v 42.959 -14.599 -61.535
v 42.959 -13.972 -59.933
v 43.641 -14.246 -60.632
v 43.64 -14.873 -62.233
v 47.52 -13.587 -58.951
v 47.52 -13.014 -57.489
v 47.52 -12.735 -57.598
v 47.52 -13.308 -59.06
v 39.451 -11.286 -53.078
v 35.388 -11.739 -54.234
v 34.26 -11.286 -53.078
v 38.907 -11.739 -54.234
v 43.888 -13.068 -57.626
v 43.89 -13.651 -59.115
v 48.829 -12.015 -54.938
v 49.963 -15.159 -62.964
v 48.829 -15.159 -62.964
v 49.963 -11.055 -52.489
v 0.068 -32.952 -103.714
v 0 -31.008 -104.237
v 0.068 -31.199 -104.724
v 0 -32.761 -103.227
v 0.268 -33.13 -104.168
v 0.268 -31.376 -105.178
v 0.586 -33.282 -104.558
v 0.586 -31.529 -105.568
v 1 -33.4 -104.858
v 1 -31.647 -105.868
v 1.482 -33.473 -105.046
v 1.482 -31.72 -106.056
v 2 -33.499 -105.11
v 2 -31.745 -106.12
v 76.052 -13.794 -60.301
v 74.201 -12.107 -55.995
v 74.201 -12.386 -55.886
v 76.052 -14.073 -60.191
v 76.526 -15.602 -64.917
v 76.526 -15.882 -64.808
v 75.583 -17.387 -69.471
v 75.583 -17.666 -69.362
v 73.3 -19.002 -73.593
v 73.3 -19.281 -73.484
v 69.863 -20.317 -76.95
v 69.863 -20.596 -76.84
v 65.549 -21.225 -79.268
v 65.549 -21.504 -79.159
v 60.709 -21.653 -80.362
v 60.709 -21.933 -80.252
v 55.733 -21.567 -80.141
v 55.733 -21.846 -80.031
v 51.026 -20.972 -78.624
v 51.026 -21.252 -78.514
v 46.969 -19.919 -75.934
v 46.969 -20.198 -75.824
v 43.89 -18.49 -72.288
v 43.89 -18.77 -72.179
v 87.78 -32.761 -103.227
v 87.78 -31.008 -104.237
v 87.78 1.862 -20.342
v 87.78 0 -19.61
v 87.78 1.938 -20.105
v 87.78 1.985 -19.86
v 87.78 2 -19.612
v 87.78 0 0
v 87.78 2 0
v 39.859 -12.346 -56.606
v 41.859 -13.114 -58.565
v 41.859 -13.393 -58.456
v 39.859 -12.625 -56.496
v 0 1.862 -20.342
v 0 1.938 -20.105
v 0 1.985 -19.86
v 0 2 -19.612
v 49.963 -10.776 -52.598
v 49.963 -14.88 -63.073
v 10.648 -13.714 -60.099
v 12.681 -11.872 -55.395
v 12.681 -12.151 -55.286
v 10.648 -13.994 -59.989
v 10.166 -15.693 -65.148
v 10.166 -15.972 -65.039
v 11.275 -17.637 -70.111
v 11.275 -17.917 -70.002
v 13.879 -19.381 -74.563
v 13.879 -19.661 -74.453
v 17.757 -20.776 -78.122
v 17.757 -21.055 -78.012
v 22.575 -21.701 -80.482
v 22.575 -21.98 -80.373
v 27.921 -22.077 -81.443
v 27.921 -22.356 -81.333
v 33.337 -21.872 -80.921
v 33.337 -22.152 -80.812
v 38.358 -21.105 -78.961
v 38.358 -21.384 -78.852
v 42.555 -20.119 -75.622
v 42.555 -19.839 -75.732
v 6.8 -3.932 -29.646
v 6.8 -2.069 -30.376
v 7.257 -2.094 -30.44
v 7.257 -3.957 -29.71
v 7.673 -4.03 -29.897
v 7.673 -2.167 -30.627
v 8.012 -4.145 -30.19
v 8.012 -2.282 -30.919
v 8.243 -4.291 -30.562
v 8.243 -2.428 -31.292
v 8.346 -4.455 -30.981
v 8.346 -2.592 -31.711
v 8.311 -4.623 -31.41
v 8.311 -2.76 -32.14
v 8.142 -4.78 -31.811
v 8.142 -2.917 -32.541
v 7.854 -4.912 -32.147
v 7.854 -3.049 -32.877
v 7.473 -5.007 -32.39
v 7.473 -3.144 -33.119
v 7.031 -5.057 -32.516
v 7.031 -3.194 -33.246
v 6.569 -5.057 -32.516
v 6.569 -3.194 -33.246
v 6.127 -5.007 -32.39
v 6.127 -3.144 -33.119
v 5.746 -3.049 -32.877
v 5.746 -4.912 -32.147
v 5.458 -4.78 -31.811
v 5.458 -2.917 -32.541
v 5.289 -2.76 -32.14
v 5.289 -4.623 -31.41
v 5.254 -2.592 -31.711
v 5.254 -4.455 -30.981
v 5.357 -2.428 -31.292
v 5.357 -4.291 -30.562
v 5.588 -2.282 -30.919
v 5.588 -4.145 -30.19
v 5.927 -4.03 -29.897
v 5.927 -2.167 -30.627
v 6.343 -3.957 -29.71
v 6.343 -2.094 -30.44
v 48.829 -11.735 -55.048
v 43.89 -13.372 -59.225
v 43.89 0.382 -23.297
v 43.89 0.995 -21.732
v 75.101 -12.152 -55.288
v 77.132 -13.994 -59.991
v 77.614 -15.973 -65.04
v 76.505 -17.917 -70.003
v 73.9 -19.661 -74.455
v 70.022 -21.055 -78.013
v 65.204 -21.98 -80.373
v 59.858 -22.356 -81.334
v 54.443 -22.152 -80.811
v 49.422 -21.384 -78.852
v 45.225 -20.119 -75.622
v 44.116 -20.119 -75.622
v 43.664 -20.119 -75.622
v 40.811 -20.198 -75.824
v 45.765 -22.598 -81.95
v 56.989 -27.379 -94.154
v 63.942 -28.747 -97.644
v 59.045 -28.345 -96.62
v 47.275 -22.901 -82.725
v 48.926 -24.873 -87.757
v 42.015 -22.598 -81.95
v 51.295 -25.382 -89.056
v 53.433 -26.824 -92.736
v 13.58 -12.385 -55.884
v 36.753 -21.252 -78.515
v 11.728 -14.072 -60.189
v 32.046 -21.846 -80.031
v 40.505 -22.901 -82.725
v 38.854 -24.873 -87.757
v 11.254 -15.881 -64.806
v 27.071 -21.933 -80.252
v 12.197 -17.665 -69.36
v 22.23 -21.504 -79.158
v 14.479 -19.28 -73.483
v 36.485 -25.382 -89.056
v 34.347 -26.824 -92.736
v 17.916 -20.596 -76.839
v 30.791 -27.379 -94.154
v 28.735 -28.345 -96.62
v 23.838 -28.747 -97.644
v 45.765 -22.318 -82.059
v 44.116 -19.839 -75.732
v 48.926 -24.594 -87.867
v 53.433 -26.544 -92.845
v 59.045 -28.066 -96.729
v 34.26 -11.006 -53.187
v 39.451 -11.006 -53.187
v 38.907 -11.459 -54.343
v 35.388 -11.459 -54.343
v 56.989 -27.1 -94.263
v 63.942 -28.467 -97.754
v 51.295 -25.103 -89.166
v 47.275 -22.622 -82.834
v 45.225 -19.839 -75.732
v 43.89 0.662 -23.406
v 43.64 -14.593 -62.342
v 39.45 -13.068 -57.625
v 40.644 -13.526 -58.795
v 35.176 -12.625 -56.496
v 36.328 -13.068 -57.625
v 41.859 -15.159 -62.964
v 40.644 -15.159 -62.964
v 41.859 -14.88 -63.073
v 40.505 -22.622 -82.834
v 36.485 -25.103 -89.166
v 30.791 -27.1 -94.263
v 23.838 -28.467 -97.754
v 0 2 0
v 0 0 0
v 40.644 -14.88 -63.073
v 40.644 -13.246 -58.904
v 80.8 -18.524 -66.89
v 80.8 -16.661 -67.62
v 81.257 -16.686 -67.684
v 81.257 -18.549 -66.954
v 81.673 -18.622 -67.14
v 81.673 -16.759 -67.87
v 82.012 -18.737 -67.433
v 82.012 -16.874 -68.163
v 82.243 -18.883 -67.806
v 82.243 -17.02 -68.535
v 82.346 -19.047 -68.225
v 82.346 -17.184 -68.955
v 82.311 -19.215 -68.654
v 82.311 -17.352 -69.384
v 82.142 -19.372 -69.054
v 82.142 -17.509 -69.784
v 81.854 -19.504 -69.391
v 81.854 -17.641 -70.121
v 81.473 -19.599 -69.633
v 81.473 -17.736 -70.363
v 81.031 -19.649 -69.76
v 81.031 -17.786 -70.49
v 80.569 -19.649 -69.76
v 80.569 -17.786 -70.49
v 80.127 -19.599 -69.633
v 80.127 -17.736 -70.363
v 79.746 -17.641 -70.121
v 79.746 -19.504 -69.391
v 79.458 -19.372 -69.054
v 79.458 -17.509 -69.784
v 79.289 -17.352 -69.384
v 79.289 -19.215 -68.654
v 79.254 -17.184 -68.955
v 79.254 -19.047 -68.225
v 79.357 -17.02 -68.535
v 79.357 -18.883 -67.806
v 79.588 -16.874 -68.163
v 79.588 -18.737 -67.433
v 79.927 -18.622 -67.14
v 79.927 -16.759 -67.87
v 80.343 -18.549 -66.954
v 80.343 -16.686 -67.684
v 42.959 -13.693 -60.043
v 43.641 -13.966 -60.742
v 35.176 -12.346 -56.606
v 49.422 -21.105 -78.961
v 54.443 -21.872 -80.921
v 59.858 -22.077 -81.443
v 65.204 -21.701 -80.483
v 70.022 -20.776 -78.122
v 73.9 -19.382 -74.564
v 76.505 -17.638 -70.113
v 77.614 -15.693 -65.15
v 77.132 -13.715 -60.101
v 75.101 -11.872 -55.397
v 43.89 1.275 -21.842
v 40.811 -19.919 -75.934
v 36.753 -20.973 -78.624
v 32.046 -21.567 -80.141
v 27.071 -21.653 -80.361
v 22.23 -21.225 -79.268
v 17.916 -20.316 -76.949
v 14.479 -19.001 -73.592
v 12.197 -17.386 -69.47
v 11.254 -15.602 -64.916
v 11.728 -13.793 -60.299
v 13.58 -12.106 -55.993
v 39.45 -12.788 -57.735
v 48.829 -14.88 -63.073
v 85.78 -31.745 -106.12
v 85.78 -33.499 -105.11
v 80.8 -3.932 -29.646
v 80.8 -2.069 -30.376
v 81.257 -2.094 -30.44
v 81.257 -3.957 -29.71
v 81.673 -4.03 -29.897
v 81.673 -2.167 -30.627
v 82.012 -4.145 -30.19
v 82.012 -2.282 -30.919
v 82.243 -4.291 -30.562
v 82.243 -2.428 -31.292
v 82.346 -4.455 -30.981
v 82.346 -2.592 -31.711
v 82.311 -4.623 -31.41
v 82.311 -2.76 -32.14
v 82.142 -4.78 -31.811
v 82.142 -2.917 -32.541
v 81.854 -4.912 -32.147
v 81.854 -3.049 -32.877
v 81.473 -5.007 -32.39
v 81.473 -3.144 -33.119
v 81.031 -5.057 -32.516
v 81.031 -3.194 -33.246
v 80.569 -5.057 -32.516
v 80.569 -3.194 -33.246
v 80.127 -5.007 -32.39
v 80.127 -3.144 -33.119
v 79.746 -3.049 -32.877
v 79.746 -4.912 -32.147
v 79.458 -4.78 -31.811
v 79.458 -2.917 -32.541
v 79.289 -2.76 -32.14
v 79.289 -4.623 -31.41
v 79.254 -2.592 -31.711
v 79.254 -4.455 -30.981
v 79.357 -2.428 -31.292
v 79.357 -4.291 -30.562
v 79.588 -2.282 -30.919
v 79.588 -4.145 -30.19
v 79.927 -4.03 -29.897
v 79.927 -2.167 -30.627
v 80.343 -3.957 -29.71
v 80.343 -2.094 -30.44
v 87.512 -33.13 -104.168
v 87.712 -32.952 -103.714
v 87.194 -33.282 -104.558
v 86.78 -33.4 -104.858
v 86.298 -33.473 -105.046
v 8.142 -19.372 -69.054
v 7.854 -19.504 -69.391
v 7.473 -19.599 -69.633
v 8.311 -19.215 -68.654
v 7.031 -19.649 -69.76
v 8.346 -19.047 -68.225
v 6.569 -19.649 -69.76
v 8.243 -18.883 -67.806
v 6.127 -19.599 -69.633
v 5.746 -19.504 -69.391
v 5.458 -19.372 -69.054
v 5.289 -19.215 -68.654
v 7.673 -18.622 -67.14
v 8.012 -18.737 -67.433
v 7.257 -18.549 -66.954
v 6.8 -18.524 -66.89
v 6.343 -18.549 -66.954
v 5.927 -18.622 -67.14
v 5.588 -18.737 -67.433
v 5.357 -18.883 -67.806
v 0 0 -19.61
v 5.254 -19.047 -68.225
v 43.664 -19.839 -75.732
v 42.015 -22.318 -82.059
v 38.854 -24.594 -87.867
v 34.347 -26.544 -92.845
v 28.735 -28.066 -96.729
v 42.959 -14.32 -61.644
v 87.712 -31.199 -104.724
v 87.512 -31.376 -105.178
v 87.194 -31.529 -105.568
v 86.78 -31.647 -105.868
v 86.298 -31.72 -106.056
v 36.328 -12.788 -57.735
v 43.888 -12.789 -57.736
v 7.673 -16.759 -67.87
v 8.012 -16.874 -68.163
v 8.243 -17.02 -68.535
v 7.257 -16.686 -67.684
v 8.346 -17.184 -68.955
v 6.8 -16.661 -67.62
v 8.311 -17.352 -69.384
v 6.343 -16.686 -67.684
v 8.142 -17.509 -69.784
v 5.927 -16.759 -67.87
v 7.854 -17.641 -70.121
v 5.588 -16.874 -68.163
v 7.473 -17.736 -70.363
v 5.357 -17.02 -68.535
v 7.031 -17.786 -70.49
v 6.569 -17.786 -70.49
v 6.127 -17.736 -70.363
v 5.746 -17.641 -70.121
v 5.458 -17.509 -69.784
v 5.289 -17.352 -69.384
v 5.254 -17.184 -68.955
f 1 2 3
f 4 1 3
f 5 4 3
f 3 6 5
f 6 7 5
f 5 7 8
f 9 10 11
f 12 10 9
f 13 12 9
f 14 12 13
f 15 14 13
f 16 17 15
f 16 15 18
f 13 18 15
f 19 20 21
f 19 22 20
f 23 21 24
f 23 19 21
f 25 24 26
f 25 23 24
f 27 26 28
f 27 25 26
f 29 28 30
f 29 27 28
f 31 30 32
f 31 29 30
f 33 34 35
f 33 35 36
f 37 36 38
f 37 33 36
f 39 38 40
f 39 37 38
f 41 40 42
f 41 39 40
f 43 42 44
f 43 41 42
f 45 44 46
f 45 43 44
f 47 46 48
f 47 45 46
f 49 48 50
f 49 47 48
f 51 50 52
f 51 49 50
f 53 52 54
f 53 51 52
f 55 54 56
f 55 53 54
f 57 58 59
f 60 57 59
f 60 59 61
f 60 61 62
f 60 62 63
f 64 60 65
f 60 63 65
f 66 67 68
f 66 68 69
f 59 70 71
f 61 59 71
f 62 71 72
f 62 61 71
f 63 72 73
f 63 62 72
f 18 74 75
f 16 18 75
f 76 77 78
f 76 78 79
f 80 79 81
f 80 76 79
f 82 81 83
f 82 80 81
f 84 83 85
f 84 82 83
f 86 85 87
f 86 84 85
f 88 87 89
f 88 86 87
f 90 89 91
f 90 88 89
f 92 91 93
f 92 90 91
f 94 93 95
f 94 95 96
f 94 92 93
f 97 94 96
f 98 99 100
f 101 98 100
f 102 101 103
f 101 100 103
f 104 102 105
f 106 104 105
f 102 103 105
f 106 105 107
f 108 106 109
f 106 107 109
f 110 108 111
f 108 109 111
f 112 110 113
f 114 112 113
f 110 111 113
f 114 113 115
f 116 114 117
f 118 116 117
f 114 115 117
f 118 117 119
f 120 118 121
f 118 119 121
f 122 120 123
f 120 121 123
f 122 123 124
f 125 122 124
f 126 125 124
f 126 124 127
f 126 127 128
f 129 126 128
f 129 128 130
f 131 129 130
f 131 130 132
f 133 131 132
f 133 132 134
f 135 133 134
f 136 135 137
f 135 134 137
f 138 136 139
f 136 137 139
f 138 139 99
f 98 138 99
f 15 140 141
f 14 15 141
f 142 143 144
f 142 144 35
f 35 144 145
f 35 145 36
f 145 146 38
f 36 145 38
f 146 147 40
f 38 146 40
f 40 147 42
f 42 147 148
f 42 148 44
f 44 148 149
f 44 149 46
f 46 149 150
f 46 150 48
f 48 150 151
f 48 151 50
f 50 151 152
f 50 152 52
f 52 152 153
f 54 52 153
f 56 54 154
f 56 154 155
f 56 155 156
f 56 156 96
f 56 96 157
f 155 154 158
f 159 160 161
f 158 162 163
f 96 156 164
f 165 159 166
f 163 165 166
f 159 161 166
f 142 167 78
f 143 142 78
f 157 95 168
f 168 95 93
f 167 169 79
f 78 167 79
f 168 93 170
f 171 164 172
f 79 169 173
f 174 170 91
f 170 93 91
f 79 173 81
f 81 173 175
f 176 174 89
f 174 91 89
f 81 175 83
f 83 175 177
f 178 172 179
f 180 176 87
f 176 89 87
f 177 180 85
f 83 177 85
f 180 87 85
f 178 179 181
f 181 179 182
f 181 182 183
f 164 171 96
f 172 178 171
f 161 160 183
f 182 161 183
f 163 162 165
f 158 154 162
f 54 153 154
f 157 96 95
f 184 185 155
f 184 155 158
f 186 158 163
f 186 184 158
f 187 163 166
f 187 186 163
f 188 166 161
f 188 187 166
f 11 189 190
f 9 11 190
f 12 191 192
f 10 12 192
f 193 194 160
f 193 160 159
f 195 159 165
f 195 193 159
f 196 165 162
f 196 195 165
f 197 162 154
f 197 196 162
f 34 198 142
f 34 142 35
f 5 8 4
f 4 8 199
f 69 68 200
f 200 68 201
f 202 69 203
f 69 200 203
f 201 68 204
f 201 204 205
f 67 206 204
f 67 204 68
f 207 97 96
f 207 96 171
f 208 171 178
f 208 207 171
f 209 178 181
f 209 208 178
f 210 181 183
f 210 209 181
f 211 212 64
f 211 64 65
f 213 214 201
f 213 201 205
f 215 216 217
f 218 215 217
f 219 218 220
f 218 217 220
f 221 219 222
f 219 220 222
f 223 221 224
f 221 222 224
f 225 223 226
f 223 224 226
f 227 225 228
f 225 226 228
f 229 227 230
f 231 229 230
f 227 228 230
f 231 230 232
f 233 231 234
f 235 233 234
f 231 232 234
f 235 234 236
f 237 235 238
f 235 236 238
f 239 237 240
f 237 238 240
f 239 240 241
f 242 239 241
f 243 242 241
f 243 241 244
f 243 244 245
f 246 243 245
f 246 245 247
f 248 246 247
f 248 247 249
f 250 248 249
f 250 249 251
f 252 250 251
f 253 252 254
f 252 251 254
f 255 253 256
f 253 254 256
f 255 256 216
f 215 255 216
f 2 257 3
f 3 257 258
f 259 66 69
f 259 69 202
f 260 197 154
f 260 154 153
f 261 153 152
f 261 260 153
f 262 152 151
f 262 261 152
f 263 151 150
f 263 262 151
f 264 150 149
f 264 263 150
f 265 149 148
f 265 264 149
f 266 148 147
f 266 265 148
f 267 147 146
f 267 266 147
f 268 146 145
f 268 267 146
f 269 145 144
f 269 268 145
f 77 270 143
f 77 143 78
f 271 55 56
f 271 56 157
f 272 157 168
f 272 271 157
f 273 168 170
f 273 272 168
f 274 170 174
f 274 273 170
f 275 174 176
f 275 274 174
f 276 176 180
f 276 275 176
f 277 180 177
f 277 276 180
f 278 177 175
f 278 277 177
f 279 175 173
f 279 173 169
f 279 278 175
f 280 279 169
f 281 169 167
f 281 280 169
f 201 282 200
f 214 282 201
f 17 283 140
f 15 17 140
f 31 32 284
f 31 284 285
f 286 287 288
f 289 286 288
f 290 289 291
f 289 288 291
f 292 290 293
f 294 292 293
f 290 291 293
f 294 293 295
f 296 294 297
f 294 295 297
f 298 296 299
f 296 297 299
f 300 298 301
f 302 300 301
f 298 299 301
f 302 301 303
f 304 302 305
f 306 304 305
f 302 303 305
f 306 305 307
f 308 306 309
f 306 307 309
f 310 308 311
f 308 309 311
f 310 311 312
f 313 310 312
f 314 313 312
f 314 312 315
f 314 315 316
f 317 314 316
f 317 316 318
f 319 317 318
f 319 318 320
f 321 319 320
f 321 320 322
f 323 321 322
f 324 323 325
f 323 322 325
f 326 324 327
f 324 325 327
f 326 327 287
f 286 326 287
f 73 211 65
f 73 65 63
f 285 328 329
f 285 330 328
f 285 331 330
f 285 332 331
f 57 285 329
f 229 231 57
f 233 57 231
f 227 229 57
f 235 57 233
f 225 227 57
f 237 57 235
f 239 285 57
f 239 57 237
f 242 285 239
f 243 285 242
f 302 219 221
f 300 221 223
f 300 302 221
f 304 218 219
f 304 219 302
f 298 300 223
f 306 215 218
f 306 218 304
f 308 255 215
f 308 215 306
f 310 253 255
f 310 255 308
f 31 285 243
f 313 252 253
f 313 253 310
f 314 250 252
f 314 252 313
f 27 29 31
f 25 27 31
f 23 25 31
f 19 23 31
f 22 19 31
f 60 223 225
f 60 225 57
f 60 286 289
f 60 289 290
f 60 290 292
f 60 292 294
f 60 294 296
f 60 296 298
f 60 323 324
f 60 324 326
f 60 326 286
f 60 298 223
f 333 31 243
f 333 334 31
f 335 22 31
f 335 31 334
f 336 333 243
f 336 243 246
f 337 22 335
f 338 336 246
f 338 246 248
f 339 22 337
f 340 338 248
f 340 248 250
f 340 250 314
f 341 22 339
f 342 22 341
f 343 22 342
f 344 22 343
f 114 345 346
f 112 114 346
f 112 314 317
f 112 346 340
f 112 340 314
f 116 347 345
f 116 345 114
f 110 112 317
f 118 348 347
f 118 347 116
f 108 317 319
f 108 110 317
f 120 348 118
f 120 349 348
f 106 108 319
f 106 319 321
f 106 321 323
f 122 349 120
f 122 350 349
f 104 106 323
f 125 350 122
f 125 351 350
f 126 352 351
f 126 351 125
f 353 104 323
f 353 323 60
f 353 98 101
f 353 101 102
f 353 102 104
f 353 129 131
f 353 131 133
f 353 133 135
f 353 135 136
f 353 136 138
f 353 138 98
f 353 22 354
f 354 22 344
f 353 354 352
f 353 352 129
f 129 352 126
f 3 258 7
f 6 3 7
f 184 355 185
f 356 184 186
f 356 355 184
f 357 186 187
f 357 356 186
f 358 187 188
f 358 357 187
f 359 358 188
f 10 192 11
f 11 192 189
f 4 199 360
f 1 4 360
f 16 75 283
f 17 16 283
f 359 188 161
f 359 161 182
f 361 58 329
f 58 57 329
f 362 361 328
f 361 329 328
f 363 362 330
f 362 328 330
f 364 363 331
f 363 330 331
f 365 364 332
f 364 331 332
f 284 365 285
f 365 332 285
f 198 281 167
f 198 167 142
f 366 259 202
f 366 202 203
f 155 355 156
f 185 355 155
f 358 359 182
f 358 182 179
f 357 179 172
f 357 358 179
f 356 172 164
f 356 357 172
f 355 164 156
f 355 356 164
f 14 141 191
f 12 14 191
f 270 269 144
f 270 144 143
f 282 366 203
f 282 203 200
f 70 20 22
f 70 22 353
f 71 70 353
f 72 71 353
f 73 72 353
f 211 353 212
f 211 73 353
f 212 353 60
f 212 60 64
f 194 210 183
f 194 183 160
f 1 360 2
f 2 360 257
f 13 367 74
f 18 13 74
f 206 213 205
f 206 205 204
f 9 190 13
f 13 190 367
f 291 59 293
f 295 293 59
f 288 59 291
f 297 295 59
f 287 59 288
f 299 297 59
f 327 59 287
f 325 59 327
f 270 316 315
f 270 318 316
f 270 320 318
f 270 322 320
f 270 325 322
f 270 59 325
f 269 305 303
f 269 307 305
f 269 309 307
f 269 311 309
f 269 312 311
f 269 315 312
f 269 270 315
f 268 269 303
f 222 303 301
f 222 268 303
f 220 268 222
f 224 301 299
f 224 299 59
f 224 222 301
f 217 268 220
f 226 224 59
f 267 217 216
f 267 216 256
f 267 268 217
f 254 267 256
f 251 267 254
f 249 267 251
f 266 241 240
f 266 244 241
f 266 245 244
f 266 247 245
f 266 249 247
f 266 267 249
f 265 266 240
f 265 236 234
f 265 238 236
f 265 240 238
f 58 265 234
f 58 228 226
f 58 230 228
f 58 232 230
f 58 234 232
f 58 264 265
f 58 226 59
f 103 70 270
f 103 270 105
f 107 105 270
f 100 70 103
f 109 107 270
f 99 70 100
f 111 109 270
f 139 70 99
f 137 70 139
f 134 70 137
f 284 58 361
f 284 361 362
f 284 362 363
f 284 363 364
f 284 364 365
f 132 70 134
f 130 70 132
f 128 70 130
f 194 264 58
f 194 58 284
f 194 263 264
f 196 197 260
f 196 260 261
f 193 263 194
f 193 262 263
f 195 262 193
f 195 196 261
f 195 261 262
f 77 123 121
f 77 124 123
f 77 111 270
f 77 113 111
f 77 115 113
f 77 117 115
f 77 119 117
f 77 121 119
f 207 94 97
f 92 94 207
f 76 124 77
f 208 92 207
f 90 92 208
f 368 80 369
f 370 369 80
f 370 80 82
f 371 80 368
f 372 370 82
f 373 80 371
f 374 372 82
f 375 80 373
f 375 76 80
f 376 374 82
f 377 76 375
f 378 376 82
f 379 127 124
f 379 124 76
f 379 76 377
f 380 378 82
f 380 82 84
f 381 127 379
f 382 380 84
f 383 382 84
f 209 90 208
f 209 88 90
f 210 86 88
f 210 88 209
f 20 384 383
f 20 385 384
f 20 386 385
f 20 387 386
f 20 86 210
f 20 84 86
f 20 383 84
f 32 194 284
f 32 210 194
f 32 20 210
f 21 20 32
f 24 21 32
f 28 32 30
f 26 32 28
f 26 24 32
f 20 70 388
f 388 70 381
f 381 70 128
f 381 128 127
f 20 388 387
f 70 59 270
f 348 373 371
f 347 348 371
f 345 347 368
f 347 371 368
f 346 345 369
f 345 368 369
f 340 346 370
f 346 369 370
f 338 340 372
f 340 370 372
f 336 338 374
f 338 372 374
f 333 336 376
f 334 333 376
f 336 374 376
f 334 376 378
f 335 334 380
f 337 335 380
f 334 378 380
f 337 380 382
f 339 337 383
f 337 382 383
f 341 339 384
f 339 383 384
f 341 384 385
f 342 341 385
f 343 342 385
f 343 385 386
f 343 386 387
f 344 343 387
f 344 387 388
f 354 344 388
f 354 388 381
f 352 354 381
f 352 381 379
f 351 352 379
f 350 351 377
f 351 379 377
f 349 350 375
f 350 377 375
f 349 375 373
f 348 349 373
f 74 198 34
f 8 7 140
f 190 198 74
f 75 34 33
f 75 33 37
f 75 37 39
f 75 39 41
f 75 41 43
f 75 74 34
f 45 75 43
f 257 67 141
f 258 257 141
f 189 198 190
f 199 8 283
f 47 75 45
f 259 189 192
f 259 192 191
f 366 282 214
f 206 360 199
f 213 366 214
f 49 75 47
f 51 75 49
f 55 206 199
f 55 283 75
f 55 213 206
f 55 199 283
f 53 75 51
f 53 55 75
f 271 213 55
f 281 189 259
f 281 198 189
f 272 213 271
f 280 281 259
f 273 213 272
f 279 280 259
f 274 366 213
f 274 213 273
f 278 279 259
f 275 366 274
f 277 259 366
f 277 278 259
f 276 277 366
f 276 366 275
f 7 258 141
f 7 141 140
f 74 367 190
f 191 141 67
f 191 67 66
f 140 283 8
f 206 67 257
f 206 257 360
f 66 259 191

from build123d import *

# Parameters (mm, degrees)
RESSALTO_EXTRUS_O1_DEPTH = 87.78
ESBO_O2_R                = 1.55
CORTE_EXTRUS_O1_DEPTH    = 2.000797456
FILETE1_R                = 2
FILETE2_R                = 2
CORTE_EXTRUS_O2_DEPTH    = 0.3
CORTE_EXTRUS_O3_DEPTH    = 0.3


with BuildPart() as part:
    # Esboço1 → Ressalto-extrusão1 (new body)
    with BuildSketch(Plane(origin=(0, 0, 0), x_dir=(0, 0, -1), z_dir=(1, 0, 0))):
        Polygon((0, 2), (19.99, 2), (106.12, -31.745348352), (105.11, -33.498517173), (19.61, 0), (0, 0), align=None)
    extrude(amount=RESSALTO_EXTRUS_O1_DEPTH)

    # Esboço2 → Corte-extrusão1 (cut)
    with BuildSketch(Plane(origin=(0, 8.523589674, -3.33950427), x_dir=(1, 0, 0), z_dir=(0, 0.9310875040982999, -0.36479591515256676))):
        with Locations(Location((80.80000159, 30.587577749, 0), (0, 0, 270))):
            Circle(ESBO_O2_R)
        with Locations(Location((6.80000159, 30.587577749, 0), (0, 0, 270))):
            Circle(ESBO_O2_R)
        with Locations(Location((80.80000159, 70.587577749, 0), (0, 0, 270))):
            Circle(ESBO_O2_R)
        with Locations(Location((6.80000159, 70.587577749, 0), (0, 0, 270))):
            Circle(ESBO_O2_R)
    extrude(amount=-CORTE_EXTRUS_O1_DEPTH, mode=Mode.SUBTRACT)

    # Filete1
    filete1_edges = [part.edges().sort_by_distance(p)[0] for p in [
        (87.78, -32.621932763, -105.615),
        (0, -32.621932763, -105.615),
    ]]
    fillet(filete1_edges, radius=FILETE1_R)

    # Filete2
    filete2_edges = [part.edges().sort_by_distance(p)[0] for p in [
        (43.89, 2, -19.99),
    ]]
    fillet(filete2_edges, radius=FILETE2_R)

    # Esboço5 → Corte-extrusão2 (cut)
    with BuildSketch(Plane(origin=(0, 8.523589674, -3.33950427), x_dir=(1, 0, 0), z_dir=(0, 0.9310875040982999, -0.36479591515256676))):
        with BuildLine():
            ThreePointArc((42.554958064, 77.750017871), (36.485484967, 92.178478749), (23.83842585, 101.401866557))
            Line((23.83842585, 101.401866557), (63.94157415, 101.401866557))
            ThreePointArc((63.94157415, 101.401866557), (51.294515033, 92.178478749), (45.225041936, 77.750017871))
            ThreePointArc((45.225041936, 77.750017871), (70.022049562, 80.317662999), (75.100625445, 55.910851333))
            Line((75.100625445, 55.910851333), (43.890007976, 19.871588801))
            Line((43.890007976, 19.871588801), (12.680587753, 55.908777517))
            ThreePointArc((12.680587753, 55.908777517), (17.756980644, 80.316954028), (42.554958064, 77.750017871))
        make_face()
        with BuildLine():
            Line((59.045444566, 100.301866557), (28.734555434, 100.301866557))
            ThreePointArc((28.734555434, 100.301866557), (38.853768409, 90.783324538), (43.663553306, 77.750017871))
            Line((43.663553306, 77.750017871), (44.116446694, 77.750017871))
            ThreePointArc((44.116446694, 77.750017871), (48.926231591, 90.783324538), (59.045444566, 100.301866557))
        make_face(mode=Mode.SUBTRACT)
        with BuildLine():
            ThreePointArc((43.89, 74.051866557), (19.984051861, 80.457020374), (13.579692383, 56.550859421))
            Line((13.579692383, 56.550859421), (43.89, 21.551866557))
            Line((43.89, 21.551866557), (74.201470581, 56.552873732))
            ThreePointArc((74.201470581, 56.552873732), (67.794940984, 80.457601856), (43.89, 74.051866557))
        make_face(mode=Mode.SUBTRACT)
    extrude(amount=-CORTE_EXTRUS_O2_DEPTH, mode=Mode.SUBTRACT)

    # Logo_MF → Corte-extrusão3 (cut)
    with BuildSketch(Plane(origin=(0, 8.523589674, -3.33950427), x_dir=(1, 0, 0), z_dir=(0, 0.9310875040982999, -0.36479591515256676))):
        Polygon((49.962573353, 64.155016633), (48.8289818, 64.155016633), (48.8289818, 55.535121255), (43.89, 60.021613531), (38.906920465, 54.778752605), (35.388063353, 54.778752605), (34.260081833, 53.537007416), (39.45058041, 53.537007416), (43.888190467, 58.422176933), (49.962573353, 52.904304422), align=None)
        Polygon((47.520333519, 58.27431755), (47.520333519, 59.844814175), (43.63988582, 63.369750961), (42.9589818, 62.620173706), (42.9589818, 60.900053981), (43.641004718, 61.650862981), align=None)
        Polygon((41.8589818, 64.155016633), (41.8589818, 59.312995139), (39.859003533, 57.208752605), (35.175514937, 57.208752605), (36.327896381, 58.421210806), (39.450099751, 58.421210806), (40.643954402, 59.677304324), (40.643954402, 64.155016633), align=None)
    extrude(amount=-CORTE_EXTRUS_O3_DEPTH, mode=Mode.SUBTRACT)


solid = part.part
